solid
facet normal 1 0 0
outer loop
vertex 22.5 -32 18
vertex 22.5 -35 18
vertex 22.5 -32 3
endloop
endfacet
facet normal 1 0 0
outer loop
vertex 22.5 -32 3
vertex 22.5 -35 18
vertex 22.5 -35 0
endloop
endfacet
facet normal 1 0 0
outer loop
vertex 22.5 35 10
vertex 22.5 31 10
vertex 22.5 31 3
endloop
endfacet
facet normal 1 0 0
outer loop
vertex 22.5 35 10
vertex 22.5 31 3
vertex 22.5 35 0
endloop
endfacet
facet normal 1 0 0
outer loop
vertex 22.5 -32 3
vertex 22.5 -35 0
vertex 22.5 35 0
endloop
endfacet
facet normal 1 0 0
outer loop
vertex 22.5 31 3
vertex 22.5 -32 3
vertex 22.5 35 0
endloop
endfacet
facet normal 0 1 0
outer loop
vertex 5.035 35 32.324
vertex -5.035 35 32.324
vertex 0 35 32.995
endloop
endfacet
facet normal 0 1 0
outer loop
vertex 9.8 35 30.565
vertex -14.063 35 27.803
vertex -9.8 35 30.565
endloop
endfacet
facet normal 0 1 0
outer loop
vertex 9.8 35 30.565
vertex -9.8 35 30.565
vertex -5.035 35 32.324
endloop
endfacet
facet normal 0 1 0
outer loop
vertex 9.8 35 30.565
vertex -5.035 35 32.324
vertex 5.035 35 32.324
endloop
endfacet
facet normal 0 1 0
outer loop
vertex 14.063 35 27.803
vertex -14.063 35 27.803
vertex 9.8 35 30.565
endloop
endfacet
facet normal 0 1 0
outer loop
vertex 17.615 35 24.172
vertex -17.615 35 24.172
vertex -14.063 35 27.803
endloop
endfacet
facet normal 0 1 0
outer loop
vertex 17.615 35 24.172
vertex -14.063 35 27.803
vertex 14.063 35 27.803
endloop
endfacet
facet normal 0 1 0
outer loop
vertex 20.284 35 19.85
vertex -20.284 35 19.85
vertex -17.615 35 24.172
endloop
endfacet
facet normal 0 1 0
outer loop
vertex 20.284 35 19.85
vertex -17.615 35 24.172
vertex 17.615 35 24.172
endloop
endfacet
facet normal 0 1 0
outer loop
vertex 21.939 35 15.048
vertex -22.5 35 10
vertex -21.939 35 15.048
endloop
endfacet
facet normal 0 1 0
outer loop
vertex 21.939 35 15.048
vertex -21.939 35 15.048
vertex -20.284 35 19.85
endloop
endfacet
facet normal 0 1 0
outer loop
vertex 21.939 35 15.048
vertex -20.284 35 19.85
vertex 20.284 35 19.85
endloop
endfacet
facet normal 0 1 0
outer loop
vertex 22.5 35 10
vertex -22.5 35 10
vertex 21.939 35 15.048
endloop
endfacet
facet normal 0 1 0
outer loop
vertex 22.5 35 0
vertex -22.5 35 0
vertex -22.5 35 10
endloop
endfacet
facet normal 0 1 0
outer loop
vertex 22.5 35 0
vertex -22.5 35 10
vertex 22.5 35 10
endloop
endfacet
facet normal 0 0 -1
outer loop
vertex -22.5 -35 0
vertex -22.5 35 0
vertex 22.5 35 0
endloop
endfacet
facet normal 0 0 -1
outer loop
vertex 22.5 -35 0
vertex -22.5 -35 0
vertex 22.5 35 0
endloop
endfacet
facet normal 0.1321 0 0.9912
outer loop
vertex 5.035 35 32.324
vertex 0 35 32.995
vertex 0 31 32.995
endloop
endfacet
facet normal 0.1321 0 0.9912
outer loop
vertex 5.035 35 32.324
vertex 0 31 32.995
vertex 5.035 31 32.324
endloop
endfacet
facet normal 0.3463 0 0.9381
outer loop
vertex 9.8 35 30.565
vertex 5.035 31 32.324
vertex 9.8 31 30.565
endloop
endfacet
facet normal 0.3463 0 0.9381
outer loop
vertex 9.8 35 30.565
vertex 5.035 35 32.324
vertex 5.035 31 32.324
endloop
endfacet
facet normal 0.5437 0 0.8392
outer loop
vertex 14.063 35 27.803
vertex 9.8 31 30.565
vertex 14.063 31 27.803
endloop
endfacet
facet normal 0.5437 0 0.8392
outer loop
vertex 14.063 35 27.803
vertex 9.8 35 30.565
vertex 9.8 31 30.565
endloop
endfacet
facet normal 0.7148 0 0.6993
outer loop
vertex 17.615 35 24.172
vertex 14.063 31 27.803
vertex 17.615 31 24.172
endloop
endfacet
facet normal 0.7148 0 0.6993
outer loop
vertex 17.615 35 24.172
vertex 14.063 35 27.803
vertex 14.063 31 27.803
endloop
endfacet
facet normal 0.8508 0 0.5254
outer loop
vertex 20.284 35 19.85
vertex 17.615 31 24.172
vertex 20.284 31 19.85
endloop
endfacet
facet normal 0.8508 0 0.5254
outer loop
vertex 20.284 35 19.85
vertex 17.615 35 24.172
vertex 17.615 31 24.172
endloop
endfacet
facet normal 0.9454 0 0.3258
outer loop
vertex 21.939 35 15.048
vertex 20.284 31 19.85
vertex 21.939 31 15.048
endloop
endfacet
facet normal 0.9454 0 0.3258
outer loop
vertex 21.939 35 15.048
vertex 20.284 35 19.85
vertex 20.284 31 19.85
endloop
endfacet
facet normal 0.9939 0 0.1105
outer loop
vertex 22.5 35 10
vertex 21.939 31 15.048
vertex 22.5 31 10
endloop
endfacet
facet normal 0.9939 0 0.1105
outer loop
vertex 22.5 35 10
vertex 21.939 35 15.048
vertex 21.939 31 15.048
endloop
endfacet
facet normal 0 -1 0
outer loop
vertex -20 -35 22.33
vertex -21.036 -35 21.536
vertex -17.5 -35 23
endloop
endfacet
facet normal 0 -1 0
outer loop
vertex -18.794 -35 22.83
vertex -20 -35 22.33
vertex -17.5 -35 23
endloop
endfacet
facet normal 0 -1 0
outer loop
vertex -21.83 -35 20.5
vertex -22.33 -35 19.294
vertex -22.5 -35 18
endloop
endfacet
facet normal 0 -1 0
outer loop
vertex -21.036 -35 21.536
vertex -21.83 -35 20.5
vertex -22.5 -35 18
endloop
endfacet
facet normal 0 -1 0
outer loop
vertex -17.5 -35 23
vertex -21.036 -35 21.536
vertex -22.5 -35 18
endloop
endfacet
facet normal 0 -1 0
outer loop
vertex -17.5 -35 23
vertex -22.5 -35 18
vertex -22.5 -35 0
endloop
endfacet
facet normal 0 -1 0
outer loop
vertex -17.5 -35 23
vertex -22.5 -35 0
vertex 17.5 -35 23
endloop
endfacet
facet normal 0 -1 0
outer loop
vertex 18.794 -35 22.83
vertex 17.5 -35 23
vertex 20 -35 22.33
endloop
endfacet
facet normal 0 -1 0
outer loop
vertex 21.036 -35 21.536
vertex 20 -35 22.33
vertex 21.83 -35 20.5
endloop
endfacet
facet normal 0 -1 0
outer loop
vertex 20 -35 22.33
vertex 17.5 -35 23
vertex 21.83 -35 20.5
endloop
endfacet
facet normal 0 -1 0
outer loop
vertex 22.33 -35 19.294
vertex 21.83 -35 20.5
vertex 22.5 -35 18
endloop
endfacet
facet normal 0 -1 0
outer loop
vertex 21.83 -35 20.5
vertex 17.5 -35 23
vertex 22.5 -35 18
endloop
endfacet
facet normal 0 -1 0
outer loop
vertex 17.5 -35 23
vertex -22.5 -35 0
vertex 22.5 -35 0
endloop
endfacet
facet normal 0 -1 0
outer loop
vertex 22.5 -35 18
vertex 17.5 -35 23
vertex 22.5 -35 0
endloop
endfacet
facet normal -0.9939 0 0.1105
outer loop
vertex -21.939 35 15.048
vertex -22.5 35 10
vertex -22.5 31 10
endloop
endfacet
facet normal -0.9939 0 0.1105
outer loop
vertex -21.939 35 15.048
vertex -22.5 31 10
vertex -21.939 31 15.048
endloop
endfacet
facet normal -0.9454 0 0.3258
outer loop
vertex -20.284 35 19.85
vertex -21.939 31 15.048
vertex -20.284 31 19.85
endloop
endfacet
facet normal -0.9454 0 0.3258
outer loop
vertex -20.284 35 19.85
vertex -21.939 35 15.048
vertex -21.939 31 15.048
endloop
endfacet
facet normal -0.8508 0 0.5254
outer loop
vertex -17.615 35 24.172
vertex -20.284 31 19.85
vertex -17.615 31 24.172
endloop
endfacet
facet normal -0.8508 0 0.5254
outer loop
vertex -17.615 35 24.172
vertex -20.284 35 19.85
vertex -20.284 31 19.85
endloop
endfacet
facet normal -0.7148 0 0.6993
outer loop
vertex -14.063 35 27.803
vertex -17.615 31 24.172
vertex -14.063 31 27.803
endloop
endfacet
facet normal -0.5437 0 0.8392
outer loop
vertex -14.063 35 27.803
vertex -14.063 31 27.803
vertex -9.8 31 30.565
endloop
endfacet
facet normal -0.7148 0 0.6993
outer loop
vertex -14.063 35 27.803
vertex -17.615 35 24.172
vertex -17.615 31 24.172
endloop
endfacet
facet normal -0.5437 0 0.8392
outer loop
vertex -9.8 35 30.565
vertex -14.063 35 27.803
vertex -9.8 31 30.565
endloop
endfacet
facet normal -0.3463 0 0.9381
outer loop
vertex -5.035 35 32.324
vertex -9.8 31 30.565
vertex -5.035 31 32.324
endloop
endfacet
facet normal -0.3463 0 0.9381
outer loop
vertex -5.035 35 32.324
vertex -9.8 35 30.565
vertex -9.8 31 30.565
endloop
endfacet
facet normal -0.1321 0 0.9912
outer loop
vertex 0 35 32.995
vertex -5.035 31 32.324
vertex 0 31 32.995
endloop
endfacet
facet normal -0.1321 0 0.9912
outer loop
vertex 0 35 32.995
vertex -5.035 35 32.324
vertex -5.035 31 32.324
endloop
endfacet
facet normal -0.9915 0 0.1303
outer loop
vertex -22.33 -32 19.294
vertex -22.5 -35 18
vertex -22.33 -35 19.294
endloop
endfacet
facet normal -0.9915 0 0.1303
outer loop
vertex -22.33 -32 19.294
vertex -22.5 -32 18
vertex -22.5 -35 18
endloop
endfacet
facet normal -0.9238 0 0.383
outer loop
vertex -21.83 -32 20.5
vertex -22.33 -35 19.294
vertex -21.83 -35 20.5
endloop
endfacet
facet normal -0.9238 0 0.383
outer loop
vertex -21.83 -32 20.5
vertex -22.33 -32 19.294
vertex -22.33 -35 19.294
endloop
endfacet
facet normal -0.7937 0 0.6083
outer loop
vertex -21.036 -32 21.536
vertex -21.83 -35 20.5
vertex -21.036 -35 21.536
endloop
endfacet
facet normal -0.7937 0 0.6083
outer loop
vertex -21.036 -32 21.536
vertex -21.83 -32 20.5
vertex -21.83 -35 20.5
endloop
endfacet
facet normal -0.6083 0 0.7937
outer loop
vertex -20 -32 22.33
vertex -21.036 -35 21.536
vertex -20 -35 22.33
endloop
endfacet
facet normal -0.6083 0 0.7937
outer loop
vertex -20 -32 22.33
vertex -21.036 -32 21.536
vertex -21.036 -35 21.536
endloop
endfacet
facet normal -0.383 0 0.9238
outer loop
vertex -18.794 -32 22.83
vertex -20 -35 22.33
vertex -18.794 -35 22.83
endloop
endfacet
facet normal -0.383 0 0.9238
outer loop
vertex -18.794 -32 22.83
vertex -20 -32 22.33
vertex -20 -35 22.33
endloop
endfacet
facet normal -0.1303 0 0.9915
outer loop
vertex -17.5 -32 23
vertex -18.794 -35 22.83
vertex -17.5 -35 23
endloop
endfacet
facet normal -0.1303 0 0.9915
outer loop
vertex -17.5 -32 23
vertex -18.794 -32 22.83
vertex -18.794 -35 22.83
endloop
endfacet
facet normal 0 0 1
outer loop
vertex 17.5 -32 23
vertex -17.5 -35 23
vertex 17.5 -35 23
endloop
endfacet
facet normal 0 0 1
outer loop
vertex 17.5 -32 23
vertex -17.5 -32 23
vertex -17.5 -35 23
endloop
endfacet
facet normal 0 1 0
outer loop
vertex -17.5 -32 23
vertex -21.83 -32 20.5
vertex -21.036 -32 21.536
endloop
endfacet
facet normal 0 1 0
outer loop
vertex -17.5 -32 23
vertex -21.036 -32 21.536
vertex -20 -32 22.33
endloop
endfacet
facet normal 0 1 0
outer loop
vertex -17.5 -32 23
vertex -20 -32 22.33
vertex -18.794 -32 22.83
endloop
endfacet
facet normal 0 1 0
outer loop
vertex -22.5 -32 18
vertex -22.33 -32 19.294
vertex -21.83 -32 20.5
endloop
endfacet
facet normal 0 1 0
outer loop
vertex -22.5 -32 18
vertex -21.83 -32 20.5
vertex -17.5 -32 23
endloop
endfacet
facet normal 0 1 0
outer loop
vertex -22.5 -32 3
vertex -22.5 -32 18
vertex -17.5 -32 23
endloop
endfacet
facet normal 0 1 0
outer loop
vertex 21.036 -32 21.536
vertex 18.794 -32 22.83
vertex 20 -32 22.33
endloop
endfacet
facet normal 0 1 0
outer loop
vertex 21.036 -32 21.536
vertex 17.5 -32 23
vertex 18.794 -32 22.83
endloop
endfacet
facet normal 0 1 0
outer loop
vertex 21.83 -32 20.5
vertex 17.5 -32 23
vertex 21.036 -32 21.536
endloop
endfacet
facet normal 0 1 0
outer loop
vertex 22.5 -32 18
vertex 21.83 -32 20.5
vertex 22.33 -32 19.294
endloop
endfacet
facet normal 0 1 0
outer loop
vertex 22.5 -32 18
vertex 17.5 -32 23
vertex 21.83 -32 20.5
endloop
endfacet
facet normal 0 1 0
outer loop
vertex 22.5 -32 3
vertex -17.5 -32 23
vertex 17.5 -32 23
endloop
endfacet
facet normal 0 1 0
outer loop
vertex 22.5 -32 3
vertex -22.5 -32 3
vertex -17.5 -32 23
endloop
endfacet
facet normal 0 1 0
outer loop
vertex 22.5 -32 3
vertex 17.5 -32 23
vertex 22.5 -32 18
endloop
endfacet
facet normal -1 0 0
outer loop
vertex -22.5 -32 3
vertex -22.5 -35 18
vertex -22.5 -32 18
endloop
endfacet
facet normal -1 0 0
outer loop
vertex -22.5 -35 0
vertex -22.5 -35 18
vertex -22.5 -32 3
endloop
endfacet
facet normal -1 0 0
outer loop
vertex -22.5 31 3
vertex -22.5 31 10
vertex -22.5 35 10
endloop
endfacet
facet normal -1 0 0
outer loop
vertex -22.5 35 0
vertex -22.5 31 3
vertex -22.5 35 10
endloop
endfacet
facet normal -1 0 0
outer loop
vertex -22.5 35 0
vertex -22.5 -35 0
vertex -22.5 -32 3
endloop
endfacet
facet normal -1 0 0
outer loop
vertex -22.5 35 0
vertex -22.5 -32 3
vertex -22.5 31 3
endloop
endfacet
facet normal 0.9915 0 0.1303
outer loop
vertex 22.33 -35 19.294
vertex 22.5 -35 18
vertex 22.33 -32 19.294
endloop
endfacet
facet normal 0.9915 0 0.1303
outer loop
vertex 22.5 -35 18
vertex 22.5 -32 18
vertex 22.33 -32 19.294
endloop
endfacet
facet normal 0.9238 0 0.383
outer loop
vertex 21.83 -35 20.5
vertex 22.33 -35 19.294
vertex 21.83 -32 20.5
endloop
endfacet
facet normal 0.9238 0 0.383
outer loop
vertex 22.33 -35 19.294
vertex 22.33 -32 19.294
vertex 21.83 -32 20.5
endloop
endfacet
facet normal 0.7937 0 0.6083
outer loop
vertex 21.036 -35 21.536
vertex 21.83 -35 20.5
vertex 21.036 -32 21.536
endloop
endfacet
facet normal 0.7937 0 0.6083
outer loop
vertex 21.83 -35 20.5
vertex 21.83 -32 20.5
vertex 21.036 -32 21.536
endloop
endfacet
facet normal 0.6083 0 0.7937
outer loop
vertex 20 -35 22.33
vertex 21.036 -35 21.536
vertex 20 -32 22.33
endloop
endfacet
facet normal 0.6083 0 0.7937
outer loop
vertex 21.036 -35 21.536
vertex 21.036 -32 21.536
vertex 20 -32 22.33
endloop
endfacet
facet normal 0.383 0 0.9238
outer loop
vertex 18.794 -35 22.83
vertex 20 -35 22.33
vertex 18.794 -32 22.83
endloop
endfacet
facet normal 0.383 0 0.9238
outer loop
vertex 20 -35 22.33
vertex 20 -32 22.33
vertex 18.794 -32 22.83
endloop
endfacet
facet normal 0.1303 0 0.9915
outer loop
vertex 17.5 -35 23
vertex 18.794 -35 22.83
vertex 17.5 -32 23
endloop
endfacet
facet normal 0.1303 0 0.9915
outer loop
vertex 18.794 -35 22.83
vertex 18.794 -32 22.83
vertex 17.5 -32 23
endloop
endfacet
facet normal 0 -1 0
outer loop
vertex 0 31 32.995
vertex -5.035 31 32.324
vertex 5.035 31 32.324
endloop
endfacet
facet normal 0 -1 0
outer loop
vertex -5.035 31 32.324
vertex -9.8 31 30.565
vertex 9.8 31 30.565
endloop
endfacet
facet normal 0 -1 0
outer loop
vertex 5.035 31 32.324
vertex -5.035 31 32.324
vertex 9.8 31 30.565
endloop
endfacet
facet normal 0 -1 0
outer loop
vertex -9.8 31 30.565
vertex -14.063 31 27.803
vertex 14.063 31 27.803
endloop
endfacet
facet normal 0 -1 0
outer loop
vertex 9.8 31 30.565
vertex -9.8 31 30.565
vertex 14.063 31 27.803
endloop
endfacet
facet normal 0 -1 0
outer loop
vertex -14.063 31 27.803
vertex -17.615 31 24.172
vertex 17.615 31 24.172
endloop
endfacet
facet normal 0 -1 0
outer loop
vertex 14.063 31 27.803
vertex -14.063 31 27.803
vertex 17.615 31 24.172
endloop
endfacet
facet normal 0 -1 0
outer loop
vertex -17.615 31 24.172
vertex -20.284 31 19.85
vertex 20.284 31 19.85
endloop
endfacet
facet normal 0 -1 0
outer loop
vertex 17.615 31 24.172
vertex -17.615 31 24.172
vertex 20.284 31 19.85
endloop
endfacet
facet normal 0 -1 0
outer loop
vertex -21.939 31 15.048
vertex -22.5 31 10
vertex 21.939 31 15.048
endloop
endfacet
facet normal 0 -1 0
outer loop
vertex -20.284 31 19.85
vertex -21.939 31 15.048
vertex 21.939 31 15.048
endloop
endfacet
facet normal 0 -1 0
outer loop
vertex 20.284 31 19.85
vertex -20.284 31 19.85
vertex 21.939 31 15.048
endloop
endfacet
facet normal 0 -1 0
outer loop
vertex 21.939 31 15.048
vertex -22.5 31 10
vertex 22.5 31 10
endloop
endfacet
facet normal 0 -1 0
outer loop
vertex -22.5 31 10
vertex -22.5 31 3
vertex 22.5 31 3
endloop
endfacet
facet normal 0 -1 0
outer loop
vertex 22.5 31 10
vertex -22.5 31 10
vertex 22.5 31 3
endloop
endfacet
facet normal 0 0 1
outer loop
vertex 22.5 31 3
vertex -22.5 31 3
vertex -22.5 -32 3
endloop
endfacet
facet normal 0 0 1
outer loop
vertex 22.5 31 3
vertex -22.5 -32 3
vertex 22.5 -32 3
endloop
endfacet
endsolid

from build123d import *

# Parameters (mm, degrees)
F0_W        = 45
F0_H        = 70
F1_DEPTH    = 3
F2_W        = 45
F2_H        = 4
F3_DEPTH    = 30
F4_T1_DEPTH = 119
F5_W        = 45
F5_H        = 3
F6_DEPTH    = 20
F7_R        = 5


# Not quite as in the source:
# - a fillet or chamfer that OpenCascade refuses, or shapes differently, is made with other operations: its cross-section is extruded or revolved along the edge and cut away or added


with BuildPart() as f1:
    # F0 (on Top) → F1 (new body)
    with BuildSketch(Plane.XY):
        Rectangle(F0_W, F0_H)
    extrude(amount=F1_DEPTH)

    # F2 (on face) → F3 (join)
    with BuildSketch(Plane.XY.offset(3)):
        with Locations((0, 33)):
            Rectangle(F2_W, F2_H)
    extrude(amount=F3_DEPTH)

    # F4: fillet of radius 23 on 2 edges, made by hand

    # F4_s2 → F4_t1 (cut)
    with BuildSketch(Plane.XZ.offset(-92.5)):
        with BuildLine():
            ThreePointArc((-22.5, 10), (-15.7634559673, 26.2634559673), (0.5, 33))
            Line((0.5, 33), (-22.5, 33))
            Line((-22.5, 33), (-22.5, 10))
        make_face()
        with BuildLine():
            ThreePointArc((-0.5, 33), (15.7634559673, 26.2634559673), (22.5, 10))
            Line((22.5, 10), (22.5, 33))
            Line((22.5, 33), (-0.5, 33))
        make_face()
    extrude(amount=F4_T1_DEPTH, mode=Mode.SUBTRACT)

    # F5 (on face) → F6 (join)
    with BuildSketch(Plane.XY.offset(3)):
        with Locations((0, -33.5)):
            Rectangle(F5_W, F5_H)
    extrude(amount=F6_DEPTH)

    # F7
    f7_edges = [f1.edges().sort_by_distance(p)[0] for p in [
        (-22.5, -33.5, 23),
        (22.5, -33.5, 23),
    ]]
    fillet(f7_edges, radius=F7_R)


solid = f1.part
